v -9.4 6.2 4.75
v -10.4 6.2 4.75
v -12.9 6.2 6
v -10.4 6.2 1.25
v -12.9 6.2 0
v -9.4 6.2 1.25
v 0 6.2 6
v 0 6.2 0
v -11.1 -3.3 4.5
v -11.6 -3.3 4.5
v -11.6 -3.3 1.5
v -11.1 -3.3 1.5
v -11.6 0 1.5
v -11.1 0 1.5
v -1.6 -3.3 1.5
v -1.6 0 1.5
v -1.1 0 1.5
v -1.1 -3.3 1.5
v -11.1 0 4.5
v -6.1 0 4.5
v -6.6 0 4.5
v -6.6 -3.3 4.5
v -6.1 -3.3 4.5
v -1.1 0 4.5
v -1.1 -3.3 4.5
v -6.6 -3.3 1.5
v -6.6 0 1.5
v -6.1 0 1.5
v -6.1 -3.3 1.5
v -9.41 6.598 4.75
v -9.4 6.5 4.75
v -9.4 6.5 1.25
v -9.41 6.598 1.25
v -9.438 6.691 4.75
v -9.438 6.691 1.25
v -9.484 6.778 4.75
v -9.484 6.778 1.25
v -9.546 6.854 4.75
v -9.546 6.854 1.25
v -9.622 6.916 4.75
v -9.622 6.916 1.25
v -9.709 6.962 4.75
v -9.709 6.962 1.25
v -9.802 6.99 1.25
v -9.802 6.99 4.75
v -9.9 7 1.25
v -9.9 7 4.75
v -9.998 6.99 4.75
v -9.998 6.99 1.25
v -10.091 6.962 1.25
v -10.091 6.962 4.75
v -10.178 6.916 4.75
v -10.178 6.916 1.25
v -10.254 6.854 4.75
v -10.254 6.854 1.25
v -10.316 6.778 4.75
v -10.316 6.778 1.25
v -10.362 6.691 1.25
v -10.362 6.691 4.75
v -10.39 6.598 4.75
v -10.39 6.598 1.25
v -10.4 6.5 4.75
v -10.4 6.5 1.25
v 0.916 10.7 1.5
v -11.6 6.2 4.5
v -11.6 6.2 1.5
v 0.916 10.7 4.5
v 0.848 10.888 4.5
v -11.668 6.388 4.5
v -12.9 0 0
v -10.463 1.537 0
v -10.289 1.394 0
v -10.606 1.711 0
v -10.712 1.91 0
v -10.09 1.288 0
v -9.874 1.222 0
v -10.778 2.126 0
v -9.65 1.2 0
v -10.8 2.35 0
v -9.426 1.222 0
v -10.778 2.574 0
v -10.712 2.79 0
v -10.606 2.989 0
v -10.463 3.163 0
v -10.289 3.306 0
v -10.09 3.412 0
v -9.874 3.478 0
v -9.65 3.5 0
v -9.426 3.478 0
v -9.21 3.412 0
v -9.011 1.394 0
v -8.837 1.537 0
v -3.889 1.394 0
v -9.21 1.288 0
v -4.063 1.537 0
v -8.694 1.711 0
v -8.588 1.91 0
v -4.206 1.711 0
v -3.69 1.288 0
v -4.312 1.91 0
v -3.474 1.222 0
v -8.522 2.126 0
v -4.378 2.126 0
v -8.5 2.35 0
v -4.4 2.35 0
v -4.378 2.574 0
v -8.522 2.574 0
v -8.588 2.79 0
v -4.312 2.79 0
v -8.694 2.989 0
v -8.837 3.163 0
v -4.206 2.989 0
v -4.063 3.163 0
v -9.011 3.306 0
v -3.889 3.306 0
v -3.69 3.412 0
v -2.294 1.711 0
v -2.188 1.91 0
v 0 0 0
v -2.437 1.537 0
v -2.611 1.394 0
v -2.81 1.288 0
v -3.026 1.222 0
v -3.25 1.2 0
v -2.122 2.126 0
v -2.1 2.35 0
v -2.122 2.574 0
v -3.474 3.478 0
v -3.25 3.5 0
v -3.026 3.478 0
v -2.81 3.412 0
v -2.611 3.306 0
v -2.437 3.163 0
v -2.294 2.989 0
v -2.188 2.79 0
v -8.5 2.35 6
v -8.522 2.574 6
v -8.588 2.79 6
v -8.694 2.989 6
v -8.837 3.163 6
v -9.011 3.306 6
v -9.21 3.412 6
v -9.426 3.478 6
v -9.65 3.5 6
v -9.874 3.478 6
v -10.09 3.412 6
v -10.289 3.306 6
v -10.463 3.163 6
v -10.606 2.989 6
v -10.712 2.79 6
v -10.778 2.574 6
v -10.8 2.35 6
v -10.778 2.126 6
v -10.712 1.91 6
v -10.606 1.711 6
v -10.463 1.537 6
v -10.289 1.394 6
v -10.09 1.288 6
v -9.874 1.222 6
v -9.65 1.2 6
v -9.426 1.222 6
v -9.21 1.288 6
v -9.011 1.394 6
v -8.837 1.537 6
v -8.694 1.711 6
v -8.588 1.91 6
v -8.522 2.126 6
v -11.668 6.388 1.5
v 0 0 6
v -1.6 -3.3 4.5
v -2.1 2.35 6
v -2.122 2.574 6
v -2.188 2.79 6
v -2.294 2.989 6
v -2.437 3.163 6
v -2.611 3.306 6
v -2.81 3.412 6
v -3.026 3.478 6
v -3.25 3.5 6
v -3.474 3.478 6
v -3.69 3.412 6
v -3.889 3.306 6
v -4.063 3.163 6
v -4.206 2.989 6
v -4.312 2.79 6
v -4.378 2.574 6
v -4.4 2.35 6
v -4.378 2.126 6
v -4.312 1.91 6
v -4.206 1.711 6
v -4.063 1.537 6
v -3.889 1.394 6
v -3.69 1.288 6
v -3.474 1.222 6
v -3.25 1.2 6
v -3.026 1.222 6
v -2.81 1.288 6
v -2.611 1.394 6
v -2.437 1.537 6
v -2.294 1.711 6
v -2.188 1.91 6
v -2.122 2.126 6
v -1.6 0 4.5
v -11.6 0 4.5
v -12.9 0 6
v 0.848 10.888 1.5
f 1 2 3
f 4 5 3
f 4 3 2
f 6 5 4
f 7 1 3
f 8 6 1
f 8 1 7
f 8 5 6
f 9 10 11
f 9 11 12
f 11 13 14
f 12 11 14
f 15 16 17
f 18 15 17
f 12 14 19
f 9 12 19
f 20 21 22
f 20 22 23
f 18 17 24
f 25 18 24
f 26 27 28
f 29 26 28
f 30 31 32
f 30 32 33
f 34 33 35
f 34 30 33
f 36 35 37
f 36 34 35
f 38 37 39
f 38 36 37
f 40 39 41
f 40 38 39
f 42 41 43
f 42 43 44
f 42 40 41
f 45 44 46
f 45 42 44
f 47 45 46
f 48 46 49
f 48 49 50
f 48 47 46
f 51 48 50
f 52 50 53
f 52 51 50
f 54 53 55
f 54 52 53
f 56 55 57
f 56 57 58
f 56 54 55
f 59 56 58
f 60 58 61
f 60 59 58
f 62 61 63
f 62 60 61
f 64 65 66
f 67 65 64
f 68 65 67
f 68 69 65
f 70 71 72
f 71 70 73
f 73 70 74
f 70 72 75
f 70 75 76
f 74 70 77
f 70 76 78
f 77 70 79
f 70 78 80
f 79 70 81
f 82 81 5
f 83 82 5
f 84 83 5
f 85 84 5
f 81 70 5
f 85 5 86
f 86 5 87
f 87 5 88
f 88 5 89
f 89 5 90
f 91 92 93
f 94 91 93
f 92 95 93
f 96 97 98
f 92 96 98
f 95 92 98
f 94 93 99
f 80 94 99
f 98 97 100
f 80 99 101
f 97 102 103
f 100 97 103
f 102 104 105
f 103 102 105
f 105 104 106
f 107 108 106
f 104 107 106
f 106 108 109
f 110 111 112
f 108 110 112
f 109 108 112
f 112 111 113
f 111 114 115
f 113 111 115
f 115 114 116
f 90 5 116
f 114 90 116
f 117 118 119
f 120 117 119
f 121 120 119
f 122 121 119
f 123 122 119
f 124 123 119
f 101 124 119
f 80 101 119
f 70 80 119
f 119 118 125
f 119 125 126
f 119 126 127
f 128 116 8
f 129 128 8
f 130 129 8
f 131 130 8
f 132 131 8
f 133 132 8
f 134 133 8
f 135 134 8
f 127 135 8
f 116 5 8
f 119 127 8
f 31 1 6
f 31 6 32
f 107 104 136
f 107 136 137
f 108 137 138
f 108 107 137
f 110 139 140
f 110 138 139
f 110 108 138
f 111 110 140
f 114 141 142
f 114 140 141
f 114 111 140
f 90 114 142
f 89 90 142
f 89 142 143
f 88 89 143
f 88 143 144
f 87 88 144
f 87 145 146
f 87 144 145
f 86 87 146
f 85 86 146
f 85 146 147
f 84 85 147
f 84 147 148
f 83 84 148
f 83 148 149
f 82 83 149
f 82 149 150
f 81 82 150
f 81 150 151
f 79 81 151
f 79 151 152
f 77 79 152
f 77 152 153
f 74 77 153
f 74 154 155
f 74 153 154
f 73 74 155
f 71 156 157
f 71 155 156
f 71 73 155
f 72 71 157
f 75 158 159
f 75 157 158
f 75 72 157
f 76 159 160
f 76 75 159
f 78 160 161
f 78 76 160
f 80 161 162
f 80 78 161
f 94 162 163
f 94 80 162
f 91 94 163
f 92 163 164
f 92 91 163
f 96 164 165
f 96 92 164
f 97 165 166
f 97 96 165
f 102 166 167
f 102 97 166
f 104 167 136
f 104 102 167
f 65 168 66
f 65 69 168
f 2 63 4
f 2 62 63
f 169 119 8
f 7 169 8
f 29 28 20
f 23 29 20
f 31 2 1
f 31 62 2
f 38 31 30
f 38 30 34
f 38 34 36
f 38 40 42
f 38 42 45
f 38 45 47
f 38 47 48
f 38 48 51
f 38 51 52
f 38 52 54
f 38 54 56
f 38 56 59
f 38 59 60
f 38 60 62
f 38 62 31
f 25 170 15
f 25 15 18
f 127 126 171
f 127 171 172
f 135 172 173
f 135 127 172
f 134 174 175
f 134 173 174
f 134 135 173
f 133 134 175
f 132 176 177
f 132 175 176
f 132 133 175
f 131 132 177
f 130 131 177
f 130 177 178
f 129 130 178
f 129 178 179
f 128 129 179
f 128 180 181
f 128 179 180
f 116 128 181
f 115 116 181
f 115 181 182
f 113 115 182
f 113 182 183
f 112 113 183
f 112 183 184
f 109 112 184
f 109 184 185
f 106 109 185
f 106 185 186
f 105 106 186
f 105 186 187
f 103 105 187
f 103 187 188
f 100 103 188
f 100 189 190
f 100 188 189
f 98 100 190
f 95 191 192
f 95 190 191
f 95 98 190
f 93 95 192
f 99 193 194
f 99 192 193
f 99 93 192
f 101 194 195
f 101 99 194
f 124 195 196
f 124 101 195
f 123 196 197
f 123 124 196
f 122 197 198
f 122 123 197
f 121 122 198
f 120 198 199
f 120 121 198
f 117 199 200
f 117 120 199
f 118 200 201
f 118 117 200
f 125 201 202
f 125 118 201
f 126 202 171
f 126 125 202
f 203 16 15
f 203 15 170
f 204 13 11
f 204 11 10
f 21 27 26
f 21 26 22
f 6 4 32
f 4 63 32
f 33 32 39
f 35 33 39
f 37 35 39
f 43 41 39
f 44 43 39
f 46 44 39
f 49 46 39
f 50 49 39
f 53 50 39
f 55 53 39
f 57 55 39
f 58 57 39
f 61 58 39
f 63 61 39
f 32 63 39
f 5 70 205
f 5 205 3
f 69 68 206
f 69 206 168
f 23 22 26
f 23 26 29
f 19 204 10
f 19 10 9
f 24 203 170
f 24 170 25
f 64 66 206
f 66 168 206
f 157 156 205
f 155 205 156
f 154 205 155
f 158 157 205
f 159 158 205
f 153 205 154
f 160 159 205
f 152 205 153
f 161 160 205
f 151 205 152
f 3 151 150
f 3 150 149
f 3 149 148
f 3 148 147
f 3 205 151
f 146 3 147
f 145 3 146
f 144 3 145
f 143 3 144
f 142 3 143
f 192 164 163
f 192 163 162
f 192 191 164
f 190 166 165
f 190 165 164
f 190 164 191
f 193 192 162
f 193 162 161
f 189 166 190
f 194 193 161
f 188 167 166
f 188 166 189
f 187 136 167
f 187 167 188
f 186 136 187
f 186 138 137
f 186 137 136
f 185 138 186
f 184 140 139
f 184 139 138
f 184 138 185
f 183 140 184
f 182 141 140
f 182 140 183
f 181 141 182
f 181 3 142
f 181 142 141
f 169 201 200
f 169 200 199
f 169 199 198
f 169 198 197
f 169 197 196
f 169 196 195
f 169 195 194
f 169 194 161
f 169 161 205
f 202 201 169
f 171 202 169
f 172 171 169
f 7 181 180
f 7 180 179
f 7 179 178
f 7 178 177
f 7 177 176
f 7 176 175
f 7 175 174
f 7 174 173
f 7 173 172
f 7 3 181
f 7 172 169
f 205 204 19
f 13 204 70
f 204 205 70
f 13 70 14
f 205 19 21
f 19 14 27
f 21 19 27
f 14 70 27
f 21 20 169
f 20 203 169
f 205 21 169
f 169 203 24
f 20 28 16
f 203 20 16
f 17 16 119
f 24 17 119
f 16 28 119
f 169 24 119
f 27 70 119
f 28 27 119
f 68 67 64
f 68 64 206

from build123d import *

# Parameters (mm, degrees)
ESBO_O1_W                  = 12.9
ESBO_O1_H                  = 6.2
RESSALTO_EXTRUS_O1_DEPTH   = 6
RESSALTO_EXTRUS_O2_DEPTH   = 1.75
CORTE_EXTRUS_O1_DEPTH      = 15.980320424
CORTE_EXTRUS_O1_DEPTH_BACK = 15.980320424
ESBO_O4_R                  = 1.15
ESBO_O5_W                  = 0.5
ESBO_O5_H                  = 3
RESSALTO_EXTRUS_O3_DEPTH   = 3.3
RESSALTO_EXTRUS_O8_DEPTH   = 1.5


with BuildPart() as part:
    # Esboço1 → Ressalto-extrusão1 (new body)
    with BuildSketch(Plane.XY):
        with Locations((-6.45, 3.1)):
            Rectangle(ESBO_O1_W, ESBO_O1_H)
    extrude(amount=RESSALTO_EXTRUS_O1_DEPTH)

    # Esboço3 → Ressalto-extrusão2 (add, symmetric)
    with BuildSketch(Plane.XY.offset(3)):
        with BuildLine():
            Line((-10.4, 6.2), (-9.4, 6.2))
            Line((-9.4, 6.2), (-9.4, 6.5))
            ThreePointArc((-9.4, 6.5), (-9.9, 7), (-10.4, 6.5))
            Line((-10.4, 6.5), (-10.4, 6.2))
        make_face()
    extrude(amount=RESSALTO_EXTRUS_O2_DEPTH, both=True)

    # Esboço4 → Corte-extrusão1 (cut, two sides: drawn at the far end of the back side and taken through both)
    with BuildSketch(Plane.XY.offset(3).offset(-CORTE_EXTRUS_O1_DEPTH_BACK)):
        with Locations((-3.25, 2.35)):
            Circle(ESBO_O4_R)
        with Locations((-9.65, 2.35)):
            Circle(ESBO_O4_R)
    extrude(amount=CORTE_EXTRUS_O1_DEPTH + CORTE_EXTRUS_O1_DEPTH_BACK, mode=Mode.SUBTRACT)

    # Esboço5 → Ressalto-extrusão3 (add)
    with BuildSketch(Plane.XZ):
        with Locations((-1.35, 3)):
            Rectangle(ESBO_O5_W, ESBO_O5_H)
        with Locations((-6.35, 3)):
            Rectangle(ESBO_O5_W, ESBO_O5_H)
        with Locations((-11.35, 3)):
            Rectangle(ESBO_O5_W, ESBO_O5_H)
    extrude(amount=RESSALTO_EXTRUS_O3_DEPTH)


with BuildPart() as body_2:
    # Esboço6 → Ressalto-extrusão8 (new, symmetric)
    with BuildSketch(Plane.XY.offset(3)):
        Polygon((-11.6, 6.2), (0.915590278, 10.7), (0.847921105, 10.888204365), (-11.667669173, 6.388204365), align=None)
    extrude(amount=RESSALTO_EXTRUS_O8_DEPTH, both=True)


solid = Compound([part.part, body_2.part])
